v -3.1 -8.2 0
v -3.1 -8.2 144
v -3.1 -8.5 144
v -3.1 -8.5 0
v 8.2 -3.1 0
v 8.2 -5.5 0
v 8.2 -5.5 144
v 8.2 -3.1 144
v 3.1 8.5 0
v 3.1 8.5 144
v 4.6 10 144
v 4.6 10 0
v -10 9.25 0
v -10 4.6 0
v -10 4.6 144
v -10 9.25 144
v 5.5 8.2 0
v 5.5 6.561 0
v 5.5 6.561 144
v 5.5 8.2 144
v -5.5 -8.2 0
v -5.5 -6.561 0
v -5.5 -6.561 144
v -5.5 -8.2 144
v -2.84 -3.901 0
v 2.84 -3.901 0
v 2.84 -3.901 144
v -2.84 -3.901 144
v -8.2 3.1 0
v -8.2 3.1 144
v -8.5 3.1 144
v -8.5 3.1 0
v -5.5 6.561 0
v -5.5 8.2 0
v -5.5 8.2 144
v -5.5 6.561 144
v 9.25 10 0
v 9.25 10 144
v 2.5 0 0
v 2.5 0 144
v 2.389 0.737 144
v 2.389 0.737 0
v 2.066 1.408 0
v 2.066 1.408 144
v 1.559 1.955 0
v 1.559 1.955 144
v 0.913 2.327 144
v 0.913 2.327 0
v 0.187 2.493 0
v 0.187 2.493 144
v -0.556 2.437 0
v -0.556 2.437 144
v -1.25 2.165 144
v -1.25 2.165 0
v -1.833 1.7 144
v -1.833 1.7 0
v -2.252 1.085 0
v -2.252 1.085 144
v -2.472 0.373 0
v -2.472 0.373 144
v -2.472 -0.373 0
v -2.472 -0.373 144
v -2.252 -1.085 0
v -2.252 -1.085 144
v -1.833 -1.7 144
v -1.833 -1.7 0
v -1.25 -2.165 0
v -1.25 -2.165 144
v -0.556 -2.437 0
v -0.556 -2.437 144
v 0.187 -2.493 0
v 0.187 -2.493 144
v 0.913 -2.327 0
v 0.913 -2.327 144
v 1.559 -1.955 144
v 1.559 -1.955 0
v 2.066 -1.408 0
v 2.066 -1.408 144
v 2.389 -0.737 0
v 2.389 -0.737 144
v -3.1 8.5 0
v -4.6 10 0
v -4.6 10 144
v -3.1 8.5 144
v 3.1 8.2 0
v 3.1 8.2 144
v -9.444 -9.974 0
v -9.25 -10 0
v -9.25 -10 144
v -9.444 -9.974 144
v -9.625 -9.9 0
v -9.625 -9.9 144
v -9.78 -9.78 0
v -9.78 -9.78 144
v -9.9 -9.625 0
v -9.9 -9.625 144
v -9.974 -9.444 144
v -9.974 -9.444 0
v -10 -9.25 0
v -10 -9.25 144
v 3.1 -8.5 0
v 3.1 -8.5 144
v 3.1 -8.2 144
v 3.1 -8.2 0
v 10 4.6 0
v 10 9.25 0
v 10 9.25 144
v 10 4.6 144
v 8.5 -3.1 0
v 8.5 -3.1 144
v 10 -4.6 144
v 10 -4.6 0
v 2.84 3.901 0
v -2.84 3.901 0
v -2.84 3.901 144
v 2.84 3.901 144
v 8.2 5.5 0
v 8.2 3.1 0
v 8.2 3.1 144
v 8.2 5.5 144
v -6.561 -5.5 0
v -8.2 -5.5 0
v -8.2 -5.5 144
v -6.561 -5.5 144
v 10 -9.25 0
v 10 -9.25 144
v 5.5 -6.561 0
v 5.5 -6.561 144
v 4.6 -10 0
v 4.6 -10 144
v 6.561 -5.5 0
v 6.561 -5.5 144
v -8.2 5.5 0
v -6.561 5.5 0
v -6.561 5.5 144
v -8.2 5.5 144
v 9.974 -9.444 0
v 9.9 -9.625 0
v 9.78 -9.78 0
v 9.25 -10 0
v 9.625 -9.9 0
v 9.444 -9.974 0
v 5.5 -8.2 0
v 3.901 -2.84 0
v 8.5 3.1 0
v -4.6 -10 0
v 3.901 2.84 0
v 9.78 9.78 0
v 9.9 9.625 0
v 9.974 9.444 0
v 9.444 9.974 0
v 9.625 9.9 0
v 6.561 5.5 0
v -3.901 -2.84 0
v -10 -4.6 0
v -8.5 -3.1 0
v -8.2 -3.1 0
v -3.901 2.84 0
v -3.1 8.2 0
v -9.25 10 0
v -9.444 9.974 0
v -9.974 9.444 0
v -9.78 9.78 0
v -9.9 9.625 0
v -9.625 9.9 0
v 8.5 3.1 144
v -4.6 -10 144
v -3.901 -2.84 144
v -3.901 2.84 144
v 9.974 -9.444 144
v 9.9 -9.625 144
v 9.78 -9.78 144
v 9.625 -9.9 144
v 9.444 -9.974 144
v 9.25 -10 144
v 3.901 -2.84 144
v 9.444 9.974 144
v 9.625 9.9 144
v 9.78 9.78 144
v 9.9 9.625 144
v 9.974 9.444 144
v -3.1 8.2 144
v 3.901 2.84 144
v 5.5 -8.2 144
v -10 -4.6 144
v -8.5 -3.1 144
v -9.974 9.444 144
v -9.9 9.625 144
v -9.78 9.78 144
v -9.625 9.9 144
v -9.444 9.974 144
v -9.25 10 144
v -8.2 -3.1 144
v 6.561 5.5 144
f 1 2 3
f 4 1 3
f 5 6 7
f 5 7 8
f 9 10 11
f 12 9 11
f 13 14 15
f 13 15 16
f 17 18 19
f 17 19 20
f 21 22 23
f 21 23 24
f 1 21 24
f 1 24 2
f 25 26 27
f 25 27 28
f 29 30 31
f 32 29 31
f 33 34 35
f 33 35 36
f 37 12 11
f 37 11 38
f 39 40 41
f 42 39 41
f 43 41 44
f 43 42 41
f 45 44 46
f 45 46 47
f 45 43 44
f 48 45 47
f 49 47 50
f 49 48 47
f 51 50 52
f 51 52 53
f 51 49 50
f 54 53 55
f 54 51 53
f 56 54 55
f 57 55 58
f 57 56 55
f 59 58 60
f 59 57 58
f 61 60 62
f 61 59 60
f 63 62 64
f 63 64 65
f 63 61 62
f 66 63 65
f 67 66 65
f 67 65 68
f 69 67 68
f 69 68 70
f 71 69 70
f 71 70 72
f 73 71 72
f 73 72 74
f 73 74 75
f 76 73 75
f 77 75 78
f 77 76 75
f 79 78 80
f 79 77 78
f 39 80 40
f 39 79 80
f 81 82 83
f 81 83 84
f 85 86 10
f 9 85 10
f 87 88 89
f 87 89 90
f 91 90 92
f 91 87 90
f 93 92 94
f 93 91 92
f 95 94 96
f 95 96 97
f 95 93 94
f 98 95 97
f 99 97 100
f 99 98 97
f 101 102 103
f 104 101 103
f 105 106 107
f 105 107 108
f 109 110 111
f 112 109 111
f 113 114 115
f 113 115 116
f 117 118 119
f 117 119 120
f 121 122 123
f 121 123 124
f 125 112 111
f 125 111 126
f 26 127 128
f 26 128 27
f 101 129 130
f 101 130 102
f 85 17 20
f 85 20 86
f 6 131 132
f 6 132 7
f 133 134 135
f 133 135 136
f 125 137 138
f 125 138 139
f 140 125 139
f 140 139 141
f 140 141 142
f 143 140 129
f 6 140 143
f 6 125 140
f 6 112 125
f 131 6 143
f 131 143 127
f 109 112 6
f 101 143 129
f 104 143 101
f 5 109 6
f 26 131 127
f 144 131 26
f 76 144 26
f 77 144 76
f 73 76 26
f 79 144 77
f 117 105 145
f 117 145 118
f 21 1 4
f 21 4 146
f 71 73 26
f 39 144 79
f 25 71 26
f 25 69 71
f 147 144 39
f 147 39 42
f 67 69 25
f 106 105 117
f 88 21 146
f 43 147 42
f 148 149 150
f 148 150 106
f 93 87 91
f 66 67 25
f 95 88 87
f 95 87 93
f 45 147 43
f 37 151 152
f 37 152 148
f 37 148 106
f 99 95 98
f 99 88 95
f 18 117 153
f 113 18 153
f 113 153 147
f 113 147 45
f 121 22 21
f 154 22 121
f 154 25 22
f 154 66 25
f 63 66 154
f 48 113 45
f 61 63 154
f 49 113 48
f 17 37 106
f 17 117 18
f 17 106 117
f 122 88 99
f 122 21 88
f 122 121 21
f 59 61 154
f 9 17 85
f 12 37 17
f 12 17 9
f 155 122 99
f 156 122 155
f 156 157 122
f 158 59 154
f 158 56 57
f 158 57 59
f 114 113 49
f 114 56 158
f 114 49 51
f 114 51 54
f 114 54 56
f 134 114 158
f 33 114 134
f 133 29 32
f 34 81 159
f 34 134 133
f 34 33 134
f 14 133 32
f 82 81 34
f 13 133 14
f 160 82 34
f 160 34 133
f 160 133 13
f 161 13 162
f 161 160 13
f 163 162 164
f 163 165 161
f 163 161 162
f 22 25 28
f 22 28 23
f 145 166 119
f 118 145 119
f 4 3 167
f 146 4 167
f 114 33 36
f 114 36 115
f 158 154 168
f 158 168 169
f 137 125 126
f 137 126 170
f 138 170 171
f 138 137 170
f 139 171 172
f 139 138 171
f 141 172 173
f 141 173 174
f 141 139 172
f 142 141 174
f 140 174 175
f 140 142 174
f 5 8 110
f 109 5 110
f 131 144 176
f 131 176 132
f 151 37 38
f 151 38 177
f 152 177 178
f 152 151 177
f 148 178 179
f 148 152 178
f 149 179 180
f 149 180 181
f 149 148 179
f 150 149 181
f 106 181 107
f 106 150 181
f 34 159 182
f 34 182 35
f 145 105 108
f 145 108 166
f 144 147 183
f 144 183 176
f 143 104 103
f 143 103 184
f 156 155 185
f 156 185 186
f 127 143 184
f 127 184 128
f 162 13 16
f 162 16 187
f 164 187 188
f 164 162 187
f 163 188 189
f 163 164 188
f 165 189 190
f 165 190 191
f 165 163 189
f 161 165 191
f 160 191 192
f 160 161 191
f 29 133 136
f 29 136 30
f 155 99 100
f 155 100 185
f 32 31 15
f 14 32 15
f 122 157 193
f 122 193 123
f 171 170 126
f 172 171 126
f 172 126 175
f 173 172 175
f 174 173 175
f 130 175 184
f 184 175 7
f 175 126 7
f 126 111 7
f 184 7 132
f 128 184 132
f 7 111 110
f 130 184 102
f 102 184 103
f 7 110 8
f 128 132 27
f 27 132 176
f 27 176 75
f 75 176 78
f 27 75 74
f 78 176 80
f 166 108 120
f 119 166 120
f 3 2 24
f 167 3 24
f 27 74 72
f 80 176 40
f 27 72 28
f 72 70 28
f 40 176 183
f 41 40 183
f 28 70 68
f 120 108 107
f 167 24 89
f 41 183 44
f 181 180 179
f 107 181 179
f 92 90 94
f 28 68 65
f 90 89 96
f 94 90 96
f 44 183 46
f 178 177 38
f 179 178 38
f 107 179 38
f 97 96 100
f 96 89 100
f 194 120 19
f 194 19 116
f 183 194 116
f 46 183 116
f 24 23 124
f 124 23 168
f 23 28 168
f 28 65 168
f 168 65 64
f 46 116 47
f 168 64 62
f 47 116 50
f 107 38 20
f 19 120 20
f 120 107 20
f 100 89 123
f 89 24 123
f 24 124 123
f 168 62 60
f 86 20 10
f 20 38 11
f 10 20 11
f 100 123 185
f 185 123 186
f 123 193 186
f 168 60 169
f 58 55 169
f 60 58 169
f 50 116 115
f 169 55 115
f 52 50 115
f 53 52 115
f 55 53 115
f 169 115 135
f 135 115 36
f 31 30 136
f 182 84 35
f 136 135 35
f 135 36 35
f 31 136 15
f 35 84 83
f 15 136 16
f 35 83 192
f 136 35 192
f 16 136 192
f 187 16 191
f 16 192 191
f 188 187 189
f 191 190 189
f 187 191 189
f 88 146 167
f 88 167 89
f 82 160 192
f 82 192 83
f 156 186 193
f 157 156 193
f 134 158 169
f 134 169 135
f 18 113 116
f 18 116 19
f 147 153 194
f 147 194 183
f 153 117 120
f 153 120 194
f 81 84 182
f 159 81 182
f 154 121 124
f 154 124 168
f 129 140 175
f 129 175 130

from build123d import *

# Parameters (mm, degrees)
CROQUIS1_R              = 2.5
SALIENTE_EXTRUIR1_DEPTH = 144


with BuildPart() as part:
    # Croquis1 → Saliente-Extruir1 (new body)
    with BuildSketch(Plane.XY):
        with BuildLine():
            Line((-4.6, 10), (-3.1, 8.5))
            Line((-3.1, 8.5), (-3.1, 8.2))
            Line((-3.1, 8.2), (-5.5, 8.2))
            Line((-5.5, 8.2), (-5.5, 6.560660172))
            Line((-5.5, 6.560660172), (-2.84, 3.900660172))
            Line((-2.84, 3.900660172), (0, 3.900660172))
            Line((0, 3.900660172), (2.84, 3.900660172))
            Line((2.84, 3.900660172), (5.5, 6.560660172))
            Line((5.5, 6.560660172), (5.5, 8.2))
            Line((5.5, 8.2), (3.1, 8.2))
            Line((3.1, 8.2), (3.1, 8.5))
            Line((3.1, 8.5), (4.6, 10))
            Line((4.6, 10), (9.25, 10))
            ThreePointArc((9.25, 10), (9.780330086, 9.780330086), (10, 9.25))
            Line((10, 9.25), (10, 4.6))
            Line((10, 4.6), (8.5, 3.1))
            Line((8.5, 3.1), (8.2, 3.1))
            Line((8.2, 3.1), (8.2, 5.5))
            Line((8.2, 5.5), (6.560660172, 5.5))
            Line((6.560660172, 5.5), (3.900660172, 2.84))
            Line((3.900660172, 2.84), (3.900660172, 0))
            Line((3.900660172, 0), (3.900660172, -2.84))
            Line((3.900660172, -2.84), (6.560660172, -5.5))
            Line((6.560660172, -5.5), (8.2, -5.5))
            Line((8.2, -5.5), (8.2, -3.1))
            Line((8.2, -3.1), (8.5, -3.1))
            Line((8.5, -3.1), (10, -4.6))
            Line((10, -4.6), (10, -9.25))
            ThreePointArc((10, -9.25), (9.780330086, -9.780330086), (9.25, -10))
            Line((9.25, -10), (4.6, -10))
            Line((4.6, -10), (3.1, -8.5))
            Line((3.1, -8.5), (3.1, -8.2))
            Line((3.1, -8.2), (5.5, -8.2))
            Line((5.5, -8.2), (5.5, -6.560660172))
            Line((5.5, -6.560660172), (2.84, -3.900660172))
            Line((2.84, -3.900660172), (0, -3.900660172))
            Line((0, -3.900660172), (-2.84, -3.900660172))
            Line((-2.84, -3.900660172), (-5.5, -6.560660172))
            Line((-5.5, -6.560660172), (-5.5, -8.2))
            Line((-5.5, -8.2), (-3.1, -8.2))
            Line((-3.1, -8.2), (-3.1, -8.5))
            Line((-3.1, -8.5), (-4.6, -10))
            Line((-4.6, -10), (-9.25, -10))
            ThreePointArc((-9.25, -10), (-9.780330086, -9.780330086), (-10, -9.25))
            Line((-10, -9.25), (-10, -4.6))
            Line((-10, -4.6), (-8.5, -3.1))
            Line((-8.5, -3.1), (-8.2, -3.1))
            Line((-8.2, -3.1), (-8.2, -5.5))
            Line((-8.2, -5.5), (-6.560660172, -5.5))
            Line((-6.560660172, -5.5), (-3.900660172, -2.84))
            Line((-3.900660172, -2.84), (-3.900660172, 0))
            Line((-3.900660172, 0), (-3.900660172, 2.84))
            Line((-3.900660172, 2.84), (-6.560660172, 5.5))
            Line((-6.560660172, 5.5), (-8.2, 5.5))
            Line((-8.2, 5.5), (-8.2, 3.1))
            Line((-8.2, 3.1), (-8.5, 3.1))
            Line((-8.5, 3.1), (-10, 4.6))
            Line((-10, 4.6), (-10, 9.25))
            ThreePointArc((-10, 9.25), (-9.780330086, 9.780330086), (-9.25, 10))
            Line((-9.25, 10), (-4.6, 10))
        make_face()
        Circle(CROQUIS1_R, mode=Mode.SUBTRACT)
    extrude(amount=SALIENTE_EXTRUIR1_DEPTH)


solid = part.part
